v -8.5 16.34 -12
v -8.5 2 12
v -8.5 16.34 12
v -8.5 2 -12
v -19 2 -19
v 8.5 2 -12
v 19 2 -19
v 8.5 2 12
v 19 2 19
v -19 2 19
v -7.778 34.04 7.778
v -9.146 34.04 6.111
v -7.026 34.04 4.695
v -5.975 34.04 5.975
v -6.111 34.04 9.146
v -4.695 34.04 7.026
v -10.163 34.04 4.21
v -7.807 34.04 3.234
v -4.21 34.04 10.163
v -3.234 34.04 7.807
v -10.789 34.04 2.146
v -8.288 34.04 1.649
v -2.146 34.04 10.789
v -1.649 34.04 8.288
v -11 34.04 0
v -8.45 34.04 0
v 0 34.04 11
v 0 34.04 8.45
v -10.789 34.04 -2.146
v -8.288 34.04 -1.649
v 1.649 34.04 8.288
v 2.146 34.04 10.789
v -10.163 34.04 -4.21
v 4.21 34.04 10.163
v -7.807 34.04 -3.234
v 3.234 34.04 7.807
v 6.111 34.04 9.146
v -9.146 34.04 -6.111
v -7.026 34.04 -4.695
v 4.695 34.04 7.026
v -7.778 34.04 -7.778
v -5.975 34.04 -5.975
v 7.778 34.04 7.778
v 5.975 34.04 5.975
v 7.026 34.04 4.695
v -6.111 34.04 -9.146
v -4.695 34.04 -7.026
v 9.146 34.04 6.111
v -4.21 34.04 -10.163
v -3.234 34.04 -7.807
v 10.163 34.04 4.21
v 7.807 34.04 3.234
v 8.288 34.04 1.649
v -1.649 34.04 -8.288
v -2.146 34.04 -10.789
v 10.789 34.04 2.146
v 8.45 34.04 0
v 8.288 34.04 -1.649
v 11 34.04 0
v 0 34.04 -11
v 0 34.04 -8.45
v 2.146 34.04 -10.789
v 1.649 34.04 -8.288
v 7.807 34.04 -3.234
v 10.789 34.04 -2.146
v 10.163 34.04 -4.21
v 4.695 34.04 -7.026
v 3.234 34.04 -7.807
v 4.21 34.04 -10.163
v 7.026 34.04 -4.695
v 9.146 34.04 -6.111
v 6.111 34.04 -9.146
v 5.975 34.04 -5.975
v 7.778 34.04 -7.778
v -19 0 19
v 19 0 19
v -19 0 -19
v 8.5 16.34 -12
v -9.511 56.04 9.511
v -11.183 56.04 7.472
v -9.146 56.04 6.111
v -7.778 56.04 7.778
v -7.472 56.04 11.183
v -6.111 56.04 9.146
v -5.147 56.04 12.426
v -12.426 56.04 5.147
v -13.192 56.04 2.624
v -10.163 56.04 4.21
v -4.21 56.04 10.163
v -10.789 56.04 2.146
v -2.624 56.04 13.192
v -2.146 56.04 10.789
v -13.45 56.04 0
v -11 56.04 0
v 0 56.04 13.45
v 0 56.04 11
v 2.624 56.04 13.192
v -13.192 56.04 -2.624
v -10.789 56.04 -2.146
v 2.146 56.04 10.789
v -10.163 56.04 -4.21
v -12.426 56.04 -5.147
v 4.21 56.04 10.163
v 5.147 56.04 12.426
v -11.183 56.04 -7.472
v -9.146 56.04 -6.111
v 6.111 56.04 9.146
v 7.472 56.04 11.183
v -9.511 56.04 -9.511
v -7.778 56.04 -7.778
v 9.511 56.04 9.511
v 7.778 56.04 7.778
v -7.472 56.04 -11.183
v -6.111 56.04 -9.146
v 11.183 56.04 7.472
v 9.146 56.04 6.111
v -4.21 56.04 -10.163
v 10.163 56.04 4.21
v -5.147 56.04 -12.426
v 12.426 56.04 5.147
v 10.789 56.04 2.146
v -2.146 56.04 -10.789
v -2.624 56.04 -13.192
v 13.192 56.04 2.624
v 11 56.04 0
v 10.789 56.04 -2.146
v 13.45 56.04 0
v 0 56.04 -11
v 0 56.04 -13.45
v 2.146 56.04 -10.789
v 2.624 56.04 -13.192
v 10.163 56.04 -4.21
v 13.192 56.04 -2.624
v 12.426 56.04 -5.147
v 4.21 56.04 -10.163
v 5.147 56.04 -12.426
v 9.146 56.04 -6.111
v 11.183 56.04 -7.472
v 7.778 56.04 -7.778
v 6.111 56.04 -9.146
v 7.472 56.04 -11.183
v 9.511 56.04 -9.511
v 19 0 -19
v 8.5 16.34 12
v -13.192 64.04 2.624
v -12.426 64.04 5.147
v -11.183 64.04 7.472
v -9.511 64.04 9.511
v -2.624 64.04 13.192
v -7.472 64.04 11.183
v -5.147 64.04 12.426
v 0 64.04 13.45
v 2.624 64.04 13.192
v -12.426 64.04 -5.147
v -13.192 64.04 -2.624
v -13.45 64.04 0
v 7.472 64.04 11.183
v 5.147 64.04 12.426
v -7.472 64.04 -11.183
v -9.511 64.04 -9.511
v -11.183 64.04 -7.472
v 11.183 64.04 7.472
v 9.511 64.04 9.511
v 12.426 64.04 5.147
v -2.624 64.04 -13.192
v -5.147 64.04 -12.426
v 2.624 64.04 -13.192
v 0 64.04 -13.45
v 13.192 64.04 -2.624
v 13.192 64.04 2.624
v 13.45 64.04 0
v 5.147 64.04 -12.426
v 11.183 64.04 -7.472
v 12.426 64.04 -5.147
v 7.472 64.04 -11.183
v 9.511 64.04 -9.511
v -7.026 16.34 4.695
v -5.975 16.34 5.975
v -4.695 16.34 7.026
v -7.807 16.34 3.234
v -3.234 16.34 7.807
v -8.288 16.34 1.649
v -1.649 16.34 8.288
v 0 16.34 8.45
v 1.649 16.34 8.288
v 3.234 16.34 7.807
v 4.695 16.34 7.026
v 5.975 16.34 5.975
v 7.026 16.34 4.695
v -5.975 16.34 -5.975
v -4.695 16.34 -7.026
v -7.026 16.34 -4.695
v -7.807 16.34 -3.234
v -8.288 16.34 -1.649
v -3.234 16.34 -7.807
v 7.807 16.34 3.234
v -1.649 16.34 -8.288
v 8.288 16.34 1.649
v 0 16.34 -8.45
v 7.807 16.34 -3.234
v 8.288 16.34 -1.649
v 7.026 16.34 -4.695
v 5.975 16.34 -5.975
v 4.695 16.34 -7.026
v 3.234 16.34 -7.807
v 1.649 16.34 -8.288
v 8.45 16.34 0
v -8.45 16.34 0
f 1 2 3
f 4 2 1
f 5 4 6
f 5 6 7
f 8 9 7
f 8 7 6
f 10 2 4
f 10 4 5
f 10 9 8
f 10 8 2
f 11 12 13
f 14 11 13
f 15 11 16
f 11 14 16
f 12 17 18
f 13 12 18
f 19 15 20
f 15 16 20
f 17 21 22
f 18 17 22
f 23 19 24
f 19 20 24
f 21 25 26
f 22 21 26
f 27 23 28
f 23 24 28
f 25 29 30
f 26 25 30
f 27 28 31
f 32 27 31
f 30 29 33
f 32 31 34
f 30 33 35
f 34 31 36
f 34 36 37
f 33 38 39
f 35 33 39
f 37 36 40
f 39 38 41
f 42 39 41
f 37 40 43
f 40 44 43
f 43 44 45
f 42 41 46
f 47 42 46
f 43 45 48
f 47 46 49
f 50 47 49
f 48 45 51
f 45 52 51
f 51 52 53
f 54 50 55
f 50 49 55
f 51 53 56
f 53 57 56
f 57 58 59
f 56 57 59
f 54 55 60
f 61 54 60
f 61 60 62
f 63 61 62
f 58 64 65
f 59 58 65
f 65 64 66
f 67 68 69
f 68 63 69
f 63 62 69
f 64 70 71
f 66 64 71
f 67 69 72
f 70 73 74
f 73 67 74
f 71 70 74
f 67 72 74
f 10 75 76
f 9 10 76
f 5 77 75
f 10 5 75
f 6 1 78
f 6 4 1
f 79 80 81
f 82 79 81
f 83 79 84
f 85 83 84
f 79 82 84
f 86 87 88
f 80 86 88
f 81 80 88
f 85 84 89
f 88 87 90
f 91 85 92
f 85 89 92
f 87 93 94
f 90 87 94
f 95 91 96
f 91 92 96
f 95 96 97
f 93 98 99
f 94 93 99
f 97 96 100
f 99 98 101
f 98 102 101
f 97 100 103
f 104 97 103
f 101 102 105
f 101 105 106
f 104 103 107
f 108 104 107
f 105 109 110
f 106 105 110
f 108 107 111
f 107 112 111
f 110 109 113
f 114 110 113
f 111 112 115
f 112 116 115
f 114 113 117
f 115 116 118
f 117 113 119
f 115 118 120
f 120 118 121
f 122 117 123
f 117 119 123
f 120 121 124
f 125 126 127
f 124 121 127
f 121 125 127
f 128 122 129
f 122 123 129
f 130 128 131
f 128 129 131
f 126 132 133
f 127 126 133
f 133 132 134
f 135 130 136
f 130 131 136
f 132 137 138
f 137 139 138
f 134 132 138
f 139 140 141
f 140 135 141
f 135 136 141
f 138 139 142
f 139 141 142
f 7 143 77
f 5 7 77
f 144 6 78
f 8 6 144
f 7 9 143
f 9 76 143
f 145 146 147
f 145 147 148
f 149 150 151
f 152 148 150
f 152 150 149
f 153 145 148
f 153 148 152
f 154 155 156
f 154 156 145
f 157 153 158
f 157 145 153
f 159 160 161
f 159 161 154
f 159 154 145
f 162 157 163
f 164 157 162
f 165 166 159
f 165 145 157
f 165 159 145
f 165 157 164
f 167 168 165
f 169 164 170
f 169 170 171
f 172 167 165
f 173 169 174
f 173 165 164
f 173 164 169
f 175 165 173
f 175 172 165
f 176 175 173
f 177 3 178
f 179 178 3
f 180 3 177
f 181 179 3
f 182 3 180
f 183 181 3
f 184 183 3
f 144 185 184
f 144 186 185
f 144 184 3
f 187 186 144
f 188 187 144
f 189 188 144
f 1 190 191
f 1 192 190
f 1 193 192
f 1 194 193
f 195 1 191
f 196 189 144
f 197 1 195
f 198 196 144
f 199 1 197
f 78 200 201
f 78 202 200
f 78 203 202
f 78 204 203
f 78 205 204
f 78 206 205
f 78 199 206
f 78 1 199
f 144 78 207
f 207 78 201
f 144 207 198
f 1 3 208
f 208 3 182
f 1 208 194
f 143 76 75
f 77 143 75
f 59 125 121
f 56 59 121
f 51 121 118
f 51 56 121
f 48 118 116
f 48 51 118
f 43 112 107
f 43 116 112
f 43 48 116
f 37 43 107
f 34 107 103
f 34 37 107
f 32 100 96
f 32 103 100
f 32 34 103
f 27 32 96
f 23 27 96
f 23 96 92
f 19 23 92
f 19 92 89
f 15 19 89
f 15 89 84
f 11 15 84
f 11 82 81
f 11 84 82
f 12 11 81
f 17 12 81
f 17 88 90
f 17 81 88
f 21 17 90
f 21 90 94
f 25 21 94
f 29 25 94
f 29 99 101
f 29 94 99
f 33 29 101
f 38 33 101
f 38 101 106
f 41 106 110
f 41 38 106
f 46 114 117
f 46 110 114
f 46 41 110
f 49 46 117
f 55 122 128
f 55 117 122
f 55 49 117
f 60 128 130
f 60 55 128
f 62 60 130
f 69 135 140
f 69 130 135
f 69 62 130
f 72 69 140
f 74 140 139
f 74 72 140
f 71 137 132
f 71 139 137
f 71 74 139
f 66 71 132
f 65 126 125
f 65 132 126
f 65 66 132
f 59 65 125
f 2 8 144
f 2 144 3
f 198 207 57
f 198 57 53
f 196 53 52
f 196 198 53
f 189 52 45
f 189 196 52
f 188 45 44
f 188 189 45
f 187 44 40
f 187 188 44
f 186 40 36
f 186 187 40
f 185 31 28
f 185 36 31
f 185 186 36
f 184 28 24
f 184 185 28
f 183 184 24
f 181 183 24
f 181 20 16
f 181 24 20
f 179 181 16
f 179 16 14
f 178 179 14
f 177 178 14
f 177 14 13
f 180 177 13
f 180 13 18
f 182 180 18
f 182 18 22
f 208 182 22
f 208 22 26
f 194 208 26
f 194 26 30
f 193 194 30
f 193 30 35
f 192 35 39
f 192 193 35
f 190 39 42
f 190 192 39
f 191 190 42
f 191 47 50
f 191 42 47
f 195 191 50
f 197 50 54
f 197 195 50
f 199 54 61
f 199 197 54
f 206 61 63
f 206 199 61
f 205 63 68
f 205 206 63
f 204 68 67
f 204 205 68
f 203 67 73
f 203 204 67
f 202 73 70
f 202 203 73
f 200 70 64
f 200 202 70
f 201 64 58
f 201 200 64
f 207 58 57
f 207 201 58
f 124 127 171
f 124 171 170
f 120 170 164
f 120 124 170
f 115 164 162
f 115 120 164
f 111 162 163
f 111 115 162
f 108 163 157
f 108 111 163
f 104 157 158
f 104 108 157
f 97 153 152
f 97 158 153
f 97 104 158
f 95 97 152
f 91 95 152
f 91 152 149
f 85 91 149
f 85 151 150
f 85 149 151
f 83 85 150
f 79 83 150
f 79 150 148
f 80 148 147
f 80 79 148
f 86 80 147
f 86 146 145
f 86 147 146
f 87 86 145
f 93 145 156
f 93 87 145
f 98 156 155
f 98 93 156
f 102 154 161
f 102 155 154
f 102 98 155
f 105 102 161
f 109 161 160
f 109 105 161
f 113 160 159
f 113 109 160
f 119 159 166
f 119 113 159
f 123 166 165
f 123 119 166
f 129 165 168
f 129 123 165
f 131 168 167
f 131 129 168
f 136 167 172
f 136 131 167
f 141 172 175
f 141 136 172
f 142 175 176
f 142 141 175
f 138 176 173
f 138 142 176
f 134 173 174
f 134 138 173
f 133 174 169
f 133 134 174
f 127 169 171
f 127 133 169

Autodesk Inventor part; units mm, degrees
ref_plane "YZ Plane" through (0, 0, 0) normal (1, 0, 0) x (0, 1, 0)
ref_plane "XZ Plane" through (0, 0, 0) normal (0, 1, 0) x (-1, 0, 0)
ref_plane "XY Plane" through (0, 0, 0) normal (0, 0, 1) x (1, 0, 0)
sketch "Sketch1" plane through (0, 0, 0) normal (0, 1, 0) x (-1, 0, 0)
  line L0 (19, 19) -> (-19, 19)
  line L1 (-19, 19) -> (-19, -19)
  line L2 (-19, -19) -> (19, -19)
  line L3 (19, -19) -> (19, 19)
  line L4 (19, 19) -> (-19, -19) construction
  line L5 (-19, 19) -> (19, -19) construction
  point P0 (0, 0)
  dimension "d0" = 38
  dimension "d1" = 38
extrude "Extrusion1" add sketch "Sketch1" along normal blind 2
sketch "Sketch2" plane through (0, 2, 0) normal (0, 1, 0) x (1, 0, 0)
  line L0 (8.5, -12) -> (-8.5, -12)
  line L1 (-8.5, -12) -> (-8.5, 12)
  line L2 (-8.5, 12) -> (8.5, 12)
  line L3 (8.5, 12) -> (8.5, -12)
  line L4 (8.5, -12) -> (-8.5, 12) construction
  line L5 (-8.5, -12) -> (8.5, 12) construction
  point P0 (0, 0)
  dimension "d4" = 17
  dimension "d5" = 24
extrude "Extrusion2" add sketch "Sketch2" along normal blind 14.34
sketch "Sketch3" plane through (0, 16.34, 0) normal (0, 1, 0) x (1, 0, 0)
  circle A0 centre (0, 0) radius 8.45
  dimension "d8" = 16.9
extrude "Extrusion3" add sketch "Sketch3" along normal blind 17.7
sketch "Sketch4" plane through (0, 34.04, 0) normal (0, 1, 0) x (1, 0, 0)
  circle A0 centre (0, 0) radius 11
  dimension "d13" = 22
extrude "Extrusion4" add sketch "Sketch4" along normal blind 22
sketch "Sketch5" plane through (0, 56.04, 0) normal (0, 1, 0) x (1, 0, 0)
  circle A0 centre (0, 0) radius 13.45
  dimension "d16" = 26.9
extrude "Extrusion5" add sketch "Sketch5" along normal blind 8
properties part number "Camera"
